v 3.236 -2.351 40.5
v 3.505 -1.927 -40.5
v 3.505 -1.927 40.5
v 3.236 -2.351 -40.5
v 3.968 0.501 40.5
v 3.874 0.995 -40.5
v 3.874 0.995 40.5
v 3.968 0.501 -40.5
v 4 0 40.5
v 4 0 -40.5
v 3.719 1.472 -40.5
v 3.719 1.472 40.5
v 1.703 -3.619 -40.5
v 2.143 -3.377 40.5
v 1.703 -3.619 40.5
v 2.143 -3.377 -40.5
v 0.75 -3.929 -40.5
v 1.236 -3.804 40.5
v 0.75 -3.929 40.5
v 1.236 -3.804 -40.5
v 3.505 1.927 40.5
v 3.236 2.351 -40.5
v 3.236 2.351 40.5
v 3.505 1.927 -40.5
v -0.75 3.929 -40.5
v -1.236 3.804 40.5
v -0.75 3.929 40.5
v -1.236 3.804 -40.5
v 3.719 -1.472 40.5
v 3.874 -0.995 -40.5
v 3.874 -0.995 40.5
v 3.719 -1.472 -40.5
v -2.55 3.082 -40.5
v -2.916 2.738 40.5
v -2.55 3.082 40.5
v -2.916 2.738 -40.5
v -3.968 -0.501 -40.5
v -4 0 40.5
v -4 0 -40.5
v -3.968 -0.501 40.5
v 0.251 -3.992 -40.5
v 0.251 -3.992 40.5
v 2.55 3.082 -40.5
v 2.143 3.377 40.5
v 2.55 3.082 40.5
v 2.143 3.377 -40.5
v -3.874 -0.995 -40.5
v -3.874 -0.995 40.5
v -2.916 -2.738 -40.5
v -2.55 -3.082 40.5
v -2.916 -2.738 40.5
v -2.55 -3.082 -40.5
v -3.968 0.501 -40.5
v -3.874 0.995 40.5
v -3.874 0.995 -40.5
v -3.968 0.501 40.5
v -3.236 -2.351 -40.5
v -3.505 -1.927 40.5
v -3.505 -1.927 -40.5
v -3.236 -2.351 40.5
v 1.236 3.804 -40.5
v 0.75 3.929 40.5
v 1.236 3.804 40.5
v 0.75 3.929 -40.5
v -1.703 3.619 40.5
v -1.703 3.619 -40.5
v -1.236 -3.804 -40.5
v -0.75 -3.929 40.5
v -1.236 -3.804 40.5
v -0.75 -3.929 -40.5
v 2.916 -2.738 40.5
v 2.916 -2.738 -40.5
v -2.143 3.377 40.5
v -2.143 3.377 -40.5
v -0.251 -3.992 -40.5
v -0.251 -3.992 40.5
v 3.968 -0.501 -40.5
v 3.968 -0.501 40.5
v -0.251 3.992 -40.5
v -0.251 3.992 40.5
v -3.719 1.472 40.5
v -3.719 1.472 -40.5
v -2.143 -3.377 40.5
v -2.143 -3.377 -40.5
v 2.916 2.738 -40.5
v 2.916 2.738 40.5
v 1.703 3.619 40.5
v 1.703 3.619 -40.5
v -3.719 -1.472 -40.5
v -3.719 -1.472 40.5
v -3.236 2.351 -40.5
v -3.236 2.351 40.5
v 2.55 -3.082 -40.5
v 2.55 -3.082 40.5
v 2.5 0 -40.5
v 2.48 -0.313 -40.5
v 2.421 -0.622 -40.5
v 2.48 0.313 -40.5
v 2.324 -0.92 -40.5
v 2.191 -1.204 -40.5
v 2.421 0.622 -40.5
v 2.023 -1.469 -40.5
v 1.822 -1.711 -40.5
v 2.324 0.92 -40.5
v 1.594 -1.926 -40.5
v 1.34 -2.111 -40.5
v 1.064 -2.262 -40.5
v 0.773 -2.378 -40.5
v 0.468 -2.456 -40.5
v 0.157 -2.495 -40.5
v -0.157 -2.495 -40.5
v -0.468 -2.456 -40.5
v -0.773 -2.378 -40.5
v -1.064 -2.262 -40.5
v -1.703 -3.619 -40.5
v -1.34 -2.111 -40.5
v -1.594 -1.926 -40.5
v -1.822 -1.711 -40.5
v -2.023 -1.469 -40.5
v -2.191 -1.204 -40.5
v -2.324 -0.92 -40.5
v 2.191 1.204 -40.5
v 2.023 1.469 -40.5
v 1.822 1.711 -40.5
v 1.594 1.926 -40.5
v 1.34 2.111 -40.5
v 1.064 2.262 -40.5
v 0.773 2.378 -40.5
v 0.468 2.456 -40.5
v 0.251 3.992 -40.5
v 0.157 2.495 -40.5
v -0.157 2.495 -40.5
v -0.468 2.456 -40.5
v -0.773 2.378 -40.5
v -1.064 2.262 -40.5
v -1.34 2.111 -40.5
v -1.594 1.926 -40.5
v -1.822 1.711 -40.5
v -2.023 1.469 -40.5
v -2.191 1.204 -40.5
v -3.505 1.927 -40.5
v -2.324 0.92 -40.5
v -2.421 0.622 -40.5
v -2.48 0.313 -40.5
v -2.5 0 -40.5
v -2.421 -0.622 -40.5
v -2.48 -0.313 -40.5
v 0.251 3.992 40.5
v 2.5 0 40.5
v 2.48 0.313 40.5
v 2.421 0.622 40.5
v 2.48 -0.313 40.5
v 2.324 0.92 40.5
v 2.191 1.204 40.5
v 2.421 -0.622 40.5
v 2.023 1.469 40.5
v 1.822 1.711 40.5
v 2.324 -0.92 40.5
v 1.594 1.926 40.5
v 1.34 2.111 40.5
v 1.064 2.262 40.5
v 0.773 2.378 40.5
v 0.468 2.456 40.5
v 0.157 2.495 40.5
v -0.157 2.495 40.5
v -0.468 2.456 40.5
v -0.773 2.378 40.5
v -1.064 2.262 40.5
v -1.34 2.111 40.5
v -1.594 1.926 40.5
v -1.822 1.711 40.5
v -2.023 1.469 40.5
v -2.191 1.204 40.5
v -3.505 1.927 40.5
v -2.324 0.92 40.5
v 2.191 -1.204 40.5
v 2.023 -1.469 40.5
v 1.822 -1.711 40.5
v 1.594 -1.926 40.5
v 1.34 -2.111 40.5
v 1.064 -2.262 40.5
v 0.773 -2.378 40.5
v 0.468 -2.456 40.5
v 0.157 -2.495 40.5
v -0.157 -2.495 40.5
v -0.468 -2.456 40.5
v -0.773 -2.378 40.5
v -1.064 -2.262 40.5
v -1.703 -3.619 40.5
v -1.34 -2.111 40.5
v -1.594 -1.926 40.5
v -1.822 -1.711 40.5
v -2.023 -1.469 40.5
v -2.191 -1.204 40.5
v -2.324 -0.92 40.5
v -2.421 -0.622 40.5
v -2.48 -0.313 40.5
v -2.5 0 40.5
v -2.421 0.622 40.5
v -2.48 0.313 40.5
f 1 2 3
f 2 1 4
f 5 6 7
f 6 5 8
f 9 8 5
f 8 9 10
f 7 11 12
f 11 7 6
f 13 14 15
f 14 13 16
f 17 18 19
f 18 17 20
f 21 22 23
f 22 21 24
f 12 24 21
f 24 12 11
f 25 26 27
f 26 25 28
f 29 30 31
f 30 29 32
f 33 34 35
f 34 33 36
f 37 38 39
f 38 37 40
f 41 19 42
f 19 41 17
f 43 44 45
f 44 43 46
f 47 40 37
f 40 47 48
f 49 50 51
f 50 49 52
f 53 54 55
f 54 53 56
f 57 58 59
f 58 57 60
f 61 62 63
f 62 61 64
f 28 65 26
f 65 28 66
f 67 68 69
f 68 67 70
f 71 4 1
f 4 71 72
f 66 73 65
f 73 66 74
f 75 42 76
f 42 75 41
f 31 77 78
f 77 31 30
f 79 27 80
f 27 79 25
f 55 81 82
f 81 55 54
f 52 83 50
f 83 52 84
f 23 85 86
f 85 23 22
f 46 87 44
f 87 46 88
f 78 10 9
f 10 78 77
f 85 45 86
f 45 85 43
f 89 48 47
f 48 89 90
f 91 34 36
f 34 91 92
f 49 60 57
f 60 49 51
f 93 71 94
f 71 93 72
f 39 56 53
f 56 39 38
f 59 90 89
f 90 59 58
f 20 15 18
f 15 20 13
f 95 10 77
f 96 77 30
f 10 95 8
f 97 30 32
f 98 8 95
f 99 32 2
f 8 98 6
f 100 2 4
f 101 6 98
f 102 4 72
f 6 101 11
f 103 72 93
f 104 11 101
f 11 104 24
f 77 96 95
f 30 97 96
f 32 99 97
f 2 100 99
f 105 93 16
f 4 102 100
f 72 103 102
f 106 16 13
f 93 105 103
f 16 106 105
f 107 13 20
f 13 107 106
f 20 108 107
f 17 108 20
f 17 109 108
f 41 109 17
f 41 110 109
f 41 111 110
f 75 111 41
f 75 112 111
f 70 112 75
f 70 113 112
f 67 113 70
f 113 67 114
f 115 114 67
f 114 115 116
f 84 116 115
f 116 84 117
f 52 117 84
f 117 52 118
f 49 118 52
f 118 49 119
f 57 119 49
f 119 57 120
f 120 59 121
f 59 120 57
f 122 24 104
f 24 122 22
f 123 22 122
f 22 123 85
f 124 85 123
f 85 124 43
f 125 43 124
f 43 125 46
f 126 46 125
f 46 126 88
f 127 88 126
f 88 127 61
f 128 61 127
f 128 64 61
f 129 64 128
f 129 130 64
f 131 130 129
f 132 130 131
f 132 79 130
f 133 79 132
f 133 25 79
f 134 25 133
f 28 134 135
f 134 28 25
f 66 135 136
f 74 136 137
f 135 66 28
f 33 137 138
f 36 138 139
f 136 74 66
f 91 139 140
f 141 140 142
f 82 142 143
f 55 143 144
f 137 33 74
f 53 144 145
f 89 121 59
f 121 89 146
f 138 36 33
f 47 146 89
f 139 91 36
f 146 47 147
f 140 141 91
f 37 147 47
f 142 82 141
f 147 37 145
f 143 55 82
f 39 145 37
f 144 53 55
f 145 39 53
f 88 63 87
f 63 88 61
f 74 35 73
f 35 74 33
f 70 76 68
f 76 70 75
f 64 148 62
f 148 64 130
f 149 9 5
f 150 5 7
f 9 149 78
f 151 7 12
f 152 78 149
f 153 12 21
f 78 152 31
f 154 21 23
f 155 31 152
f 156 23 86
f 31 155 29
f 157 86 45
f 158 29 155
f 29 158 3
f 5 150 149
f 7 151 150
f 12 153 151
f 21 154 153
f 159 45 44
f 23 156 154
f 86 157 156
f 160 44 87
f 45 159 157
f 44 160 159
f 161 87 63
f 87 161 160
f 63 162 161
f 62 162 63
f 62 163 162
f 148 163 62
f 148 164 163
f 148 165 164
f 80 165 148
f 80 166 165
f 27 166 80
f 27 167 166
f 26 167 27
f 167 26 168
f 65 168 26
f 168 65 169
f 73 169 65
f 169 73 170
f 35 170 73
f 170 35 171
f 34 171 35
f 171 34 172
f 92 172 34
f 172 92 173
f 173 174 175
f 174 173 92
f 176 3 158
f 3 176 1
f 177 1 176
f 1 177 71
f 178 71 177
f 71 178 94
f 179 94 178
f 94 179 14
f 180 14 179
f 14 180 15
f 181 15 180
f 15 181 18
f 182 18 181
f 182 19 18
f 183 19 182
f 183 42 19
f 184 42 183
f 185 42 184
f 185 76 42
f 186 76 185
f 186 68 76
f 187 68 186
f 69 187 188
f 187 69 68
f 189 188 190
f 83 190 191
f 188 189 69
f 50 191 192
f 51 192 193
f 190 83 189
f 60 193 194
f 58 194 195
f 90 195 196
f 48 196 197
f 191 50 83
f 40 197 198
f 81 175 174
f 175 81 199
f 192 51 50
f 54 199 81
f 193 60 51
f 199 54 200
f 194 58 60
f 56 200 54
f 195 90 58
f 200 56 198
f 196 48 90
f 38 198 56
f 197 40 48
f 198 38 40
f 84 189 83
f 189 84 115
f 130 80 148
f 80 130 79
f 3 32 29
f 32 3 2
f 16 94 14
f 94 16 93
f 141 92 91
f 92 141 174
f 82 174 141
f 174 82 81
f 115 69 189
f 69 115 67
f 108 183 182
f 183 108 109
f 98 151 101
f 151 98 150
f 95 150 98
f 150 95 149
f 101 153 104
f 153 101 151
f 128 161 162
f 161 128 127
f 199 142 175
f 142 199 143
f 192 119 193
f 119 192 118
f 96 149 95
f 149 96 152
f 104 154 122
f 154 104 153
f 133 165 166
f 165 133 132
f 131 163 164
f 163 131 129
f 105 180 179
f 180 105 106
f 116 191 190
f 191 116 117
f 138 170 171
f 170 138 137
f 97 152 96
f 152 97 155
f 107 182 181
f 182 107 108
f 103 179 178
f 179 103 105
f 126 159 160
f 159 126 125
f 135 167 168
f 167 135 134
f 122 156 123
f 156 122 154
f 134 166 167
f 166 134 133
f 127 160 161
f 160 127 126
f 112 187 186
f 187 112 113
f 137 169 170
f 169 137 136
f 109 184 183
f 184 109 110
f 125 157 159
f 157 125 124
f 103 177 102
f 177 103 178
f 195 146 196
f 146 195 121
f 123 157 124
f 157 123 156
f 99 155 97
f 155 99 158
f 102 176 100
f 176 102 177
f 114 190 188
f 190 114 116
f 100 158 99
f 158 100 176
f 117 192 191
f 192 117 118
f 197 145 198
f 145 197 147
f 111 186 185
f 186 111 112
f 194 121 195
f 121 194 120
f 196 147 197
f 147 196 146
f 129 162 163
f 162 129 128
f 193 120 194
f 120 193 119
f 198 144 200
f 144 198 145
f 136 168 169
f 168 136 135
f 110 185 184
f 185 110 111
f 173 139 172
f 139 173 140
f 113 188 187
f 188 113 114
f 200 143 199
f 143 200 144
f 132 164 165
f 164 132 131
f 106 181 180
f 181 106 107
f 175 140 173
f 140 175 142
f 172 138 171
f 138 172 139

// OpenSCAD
$fn = 50;


difference() {
	union() {
		translate(v = [0, 0, -40.5000000000]) {
			cylinder(h = 81, r = 4.0000000000);
		}
	}
	union() {
		translate(v = [0, 0, -100.0000000000]) {
			cylinder(h = 200, r = 2.5000000000);
		}
	}
}
